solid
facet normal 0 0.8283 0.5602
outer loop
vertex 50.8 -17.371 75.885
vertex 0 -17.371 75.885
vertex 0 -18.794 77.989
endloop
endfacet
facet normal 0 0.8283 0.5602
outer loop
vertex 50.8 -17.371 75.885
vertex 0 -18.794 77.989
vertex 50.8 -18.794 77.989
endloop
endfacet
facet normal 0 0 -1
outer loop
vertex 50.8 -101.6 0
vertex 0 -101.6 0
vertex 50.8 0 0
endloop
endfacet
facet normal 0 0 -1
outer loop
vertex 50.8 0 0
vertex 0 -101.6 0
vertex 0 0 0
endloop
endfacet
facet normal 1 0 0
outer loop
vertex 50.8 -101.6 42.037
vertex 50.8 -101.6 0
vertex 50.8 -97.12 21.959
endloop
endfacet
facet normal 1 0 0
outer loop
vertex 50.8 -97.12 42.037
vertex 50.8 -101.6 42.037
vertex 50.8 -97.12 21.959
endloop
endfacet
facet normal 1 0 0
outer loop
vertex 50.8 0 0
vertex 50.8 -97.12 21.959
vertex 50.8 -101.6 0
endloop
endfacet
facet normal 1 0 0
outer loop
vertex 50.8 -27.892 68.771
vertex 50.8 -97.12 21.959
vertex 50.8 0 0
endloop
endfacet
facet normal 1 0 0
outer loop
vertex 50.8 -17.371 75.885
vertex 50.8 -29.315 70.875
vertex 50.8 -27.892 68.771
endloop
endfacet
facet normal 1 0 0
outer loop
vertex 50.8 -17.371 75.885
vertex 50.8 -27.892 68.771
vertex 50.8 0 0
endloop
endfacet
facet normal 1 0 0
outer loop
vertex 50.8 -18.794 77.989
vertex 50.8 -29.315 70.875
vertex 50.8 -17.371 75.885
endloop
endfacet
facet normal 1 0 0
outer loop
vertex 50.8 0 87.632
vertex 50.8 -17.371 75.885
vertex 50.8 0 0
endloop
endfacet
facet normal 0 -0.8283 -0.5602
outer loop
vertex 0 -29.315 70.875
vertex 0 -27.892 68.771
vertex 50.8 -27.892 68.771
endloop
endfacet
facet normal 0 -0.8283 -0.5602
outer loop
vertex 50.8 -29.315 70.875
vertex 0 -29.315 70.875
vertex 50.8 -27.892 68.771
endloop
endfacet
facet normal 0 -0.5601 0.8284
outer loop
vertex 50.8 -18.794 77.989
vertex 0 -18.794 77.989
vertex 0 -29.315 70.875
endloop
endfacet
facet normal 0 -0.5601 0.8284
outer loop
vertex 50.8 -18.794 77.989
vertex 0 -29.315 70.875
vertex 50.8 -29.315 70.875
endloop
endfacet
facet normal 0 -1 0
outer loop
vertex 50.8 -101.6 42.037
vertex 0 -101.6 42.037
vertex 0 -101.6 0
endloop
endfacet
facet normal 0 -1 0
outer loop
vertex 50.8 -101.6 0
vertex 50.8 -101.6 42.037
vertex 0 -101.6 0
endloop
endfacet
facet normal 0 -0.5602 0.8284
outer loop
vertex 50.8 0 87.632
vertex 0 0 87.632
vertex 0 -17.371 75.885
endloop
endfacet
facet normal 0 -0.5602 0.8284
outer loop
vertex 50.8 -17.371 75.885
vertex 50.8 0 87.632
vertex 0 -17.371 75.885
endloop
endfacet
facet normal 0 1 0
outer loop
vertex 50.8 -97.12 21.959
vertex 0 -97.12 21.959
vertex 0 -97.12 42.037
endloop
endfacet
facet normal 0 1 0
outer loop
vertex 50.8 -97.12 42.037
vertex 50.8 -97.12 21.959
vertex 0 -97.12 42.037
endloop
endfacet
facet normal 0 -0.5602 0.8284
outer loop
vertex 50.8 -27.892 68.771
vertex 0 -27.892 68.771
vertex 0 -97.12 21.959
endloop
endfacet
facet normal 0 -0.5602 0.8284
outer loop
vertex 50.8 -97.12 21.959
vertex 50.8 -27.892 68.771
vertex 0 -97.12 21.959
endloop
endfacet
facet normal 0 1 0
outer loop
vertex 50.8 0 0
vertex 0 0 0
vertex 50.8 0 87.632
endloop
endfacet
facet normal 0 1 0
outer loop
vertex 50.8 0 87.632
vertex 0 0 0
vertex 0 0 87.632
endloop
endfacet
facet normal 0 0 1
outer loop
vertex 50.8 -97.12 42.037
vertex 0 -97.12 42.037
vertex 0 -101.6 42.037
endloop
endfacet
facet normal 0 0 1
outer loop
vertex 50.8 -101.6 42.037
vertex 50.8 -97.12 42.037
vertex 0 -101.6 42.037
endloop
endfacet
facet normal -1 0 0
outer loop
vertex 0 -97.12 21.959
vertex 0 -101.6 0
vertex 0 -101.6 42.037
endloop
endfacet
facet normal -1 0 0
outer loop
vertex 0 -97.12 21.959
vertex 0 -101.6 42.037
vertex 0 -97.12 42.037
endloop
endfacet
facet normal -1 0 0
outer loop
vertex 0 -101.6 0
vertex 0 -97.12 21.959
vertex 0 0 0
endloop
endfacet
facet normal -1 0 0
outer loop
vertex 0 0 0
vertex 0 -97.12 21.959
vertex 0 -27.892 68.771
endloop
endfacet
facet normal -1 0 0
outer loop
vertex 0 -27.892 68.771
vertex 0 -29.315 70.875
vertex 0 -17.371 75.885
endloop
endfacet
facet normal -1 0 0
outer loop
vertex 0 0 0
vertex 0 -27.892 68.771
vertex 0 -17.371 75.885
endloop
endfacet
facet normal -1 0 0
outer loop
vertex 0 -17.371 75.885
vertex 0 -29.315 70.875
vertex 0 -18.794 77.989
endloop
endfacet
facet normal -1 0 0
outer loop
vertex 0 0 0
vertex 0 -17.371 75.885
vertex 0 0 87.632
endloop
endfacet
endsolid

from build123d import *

# Parameters (mm, degrees)
F1_DEPTH = 50.8
F2_W     = 50.8
F2_H     = 12.7
F3_DEPTH = 2.54


with BuildPart() as f1:
    # F0 (on Right) → F1 (new body)
    with BuildSketch(Plane.YZ):
        Polygon((-97.119585, 21.958653), (-101.6, 18.928962), (-101.6, 0), (0, 0), (0, 87.63165), align=None)
        Polygon((-101.6, 42.036834), (-101.6, 18.928962), (-97.119585, 21.958653), (-97.119585, 42.036834), align=None)
    extrude(amount=F1_DEPTH)

    # F2 (on face) → F3 (join)
    with BuildSketch(Plane(origin=(0, -40.663519, 60.134671), x_dir=(1, 0, 0), z_dir=(0, -0.56016, 0.828385))):
        with Locations((25.4, 21.767601)):
            Rectangle(F2_W, F2_H)
    extrude(amount=F3_DEPTH)


solid = f1.part
